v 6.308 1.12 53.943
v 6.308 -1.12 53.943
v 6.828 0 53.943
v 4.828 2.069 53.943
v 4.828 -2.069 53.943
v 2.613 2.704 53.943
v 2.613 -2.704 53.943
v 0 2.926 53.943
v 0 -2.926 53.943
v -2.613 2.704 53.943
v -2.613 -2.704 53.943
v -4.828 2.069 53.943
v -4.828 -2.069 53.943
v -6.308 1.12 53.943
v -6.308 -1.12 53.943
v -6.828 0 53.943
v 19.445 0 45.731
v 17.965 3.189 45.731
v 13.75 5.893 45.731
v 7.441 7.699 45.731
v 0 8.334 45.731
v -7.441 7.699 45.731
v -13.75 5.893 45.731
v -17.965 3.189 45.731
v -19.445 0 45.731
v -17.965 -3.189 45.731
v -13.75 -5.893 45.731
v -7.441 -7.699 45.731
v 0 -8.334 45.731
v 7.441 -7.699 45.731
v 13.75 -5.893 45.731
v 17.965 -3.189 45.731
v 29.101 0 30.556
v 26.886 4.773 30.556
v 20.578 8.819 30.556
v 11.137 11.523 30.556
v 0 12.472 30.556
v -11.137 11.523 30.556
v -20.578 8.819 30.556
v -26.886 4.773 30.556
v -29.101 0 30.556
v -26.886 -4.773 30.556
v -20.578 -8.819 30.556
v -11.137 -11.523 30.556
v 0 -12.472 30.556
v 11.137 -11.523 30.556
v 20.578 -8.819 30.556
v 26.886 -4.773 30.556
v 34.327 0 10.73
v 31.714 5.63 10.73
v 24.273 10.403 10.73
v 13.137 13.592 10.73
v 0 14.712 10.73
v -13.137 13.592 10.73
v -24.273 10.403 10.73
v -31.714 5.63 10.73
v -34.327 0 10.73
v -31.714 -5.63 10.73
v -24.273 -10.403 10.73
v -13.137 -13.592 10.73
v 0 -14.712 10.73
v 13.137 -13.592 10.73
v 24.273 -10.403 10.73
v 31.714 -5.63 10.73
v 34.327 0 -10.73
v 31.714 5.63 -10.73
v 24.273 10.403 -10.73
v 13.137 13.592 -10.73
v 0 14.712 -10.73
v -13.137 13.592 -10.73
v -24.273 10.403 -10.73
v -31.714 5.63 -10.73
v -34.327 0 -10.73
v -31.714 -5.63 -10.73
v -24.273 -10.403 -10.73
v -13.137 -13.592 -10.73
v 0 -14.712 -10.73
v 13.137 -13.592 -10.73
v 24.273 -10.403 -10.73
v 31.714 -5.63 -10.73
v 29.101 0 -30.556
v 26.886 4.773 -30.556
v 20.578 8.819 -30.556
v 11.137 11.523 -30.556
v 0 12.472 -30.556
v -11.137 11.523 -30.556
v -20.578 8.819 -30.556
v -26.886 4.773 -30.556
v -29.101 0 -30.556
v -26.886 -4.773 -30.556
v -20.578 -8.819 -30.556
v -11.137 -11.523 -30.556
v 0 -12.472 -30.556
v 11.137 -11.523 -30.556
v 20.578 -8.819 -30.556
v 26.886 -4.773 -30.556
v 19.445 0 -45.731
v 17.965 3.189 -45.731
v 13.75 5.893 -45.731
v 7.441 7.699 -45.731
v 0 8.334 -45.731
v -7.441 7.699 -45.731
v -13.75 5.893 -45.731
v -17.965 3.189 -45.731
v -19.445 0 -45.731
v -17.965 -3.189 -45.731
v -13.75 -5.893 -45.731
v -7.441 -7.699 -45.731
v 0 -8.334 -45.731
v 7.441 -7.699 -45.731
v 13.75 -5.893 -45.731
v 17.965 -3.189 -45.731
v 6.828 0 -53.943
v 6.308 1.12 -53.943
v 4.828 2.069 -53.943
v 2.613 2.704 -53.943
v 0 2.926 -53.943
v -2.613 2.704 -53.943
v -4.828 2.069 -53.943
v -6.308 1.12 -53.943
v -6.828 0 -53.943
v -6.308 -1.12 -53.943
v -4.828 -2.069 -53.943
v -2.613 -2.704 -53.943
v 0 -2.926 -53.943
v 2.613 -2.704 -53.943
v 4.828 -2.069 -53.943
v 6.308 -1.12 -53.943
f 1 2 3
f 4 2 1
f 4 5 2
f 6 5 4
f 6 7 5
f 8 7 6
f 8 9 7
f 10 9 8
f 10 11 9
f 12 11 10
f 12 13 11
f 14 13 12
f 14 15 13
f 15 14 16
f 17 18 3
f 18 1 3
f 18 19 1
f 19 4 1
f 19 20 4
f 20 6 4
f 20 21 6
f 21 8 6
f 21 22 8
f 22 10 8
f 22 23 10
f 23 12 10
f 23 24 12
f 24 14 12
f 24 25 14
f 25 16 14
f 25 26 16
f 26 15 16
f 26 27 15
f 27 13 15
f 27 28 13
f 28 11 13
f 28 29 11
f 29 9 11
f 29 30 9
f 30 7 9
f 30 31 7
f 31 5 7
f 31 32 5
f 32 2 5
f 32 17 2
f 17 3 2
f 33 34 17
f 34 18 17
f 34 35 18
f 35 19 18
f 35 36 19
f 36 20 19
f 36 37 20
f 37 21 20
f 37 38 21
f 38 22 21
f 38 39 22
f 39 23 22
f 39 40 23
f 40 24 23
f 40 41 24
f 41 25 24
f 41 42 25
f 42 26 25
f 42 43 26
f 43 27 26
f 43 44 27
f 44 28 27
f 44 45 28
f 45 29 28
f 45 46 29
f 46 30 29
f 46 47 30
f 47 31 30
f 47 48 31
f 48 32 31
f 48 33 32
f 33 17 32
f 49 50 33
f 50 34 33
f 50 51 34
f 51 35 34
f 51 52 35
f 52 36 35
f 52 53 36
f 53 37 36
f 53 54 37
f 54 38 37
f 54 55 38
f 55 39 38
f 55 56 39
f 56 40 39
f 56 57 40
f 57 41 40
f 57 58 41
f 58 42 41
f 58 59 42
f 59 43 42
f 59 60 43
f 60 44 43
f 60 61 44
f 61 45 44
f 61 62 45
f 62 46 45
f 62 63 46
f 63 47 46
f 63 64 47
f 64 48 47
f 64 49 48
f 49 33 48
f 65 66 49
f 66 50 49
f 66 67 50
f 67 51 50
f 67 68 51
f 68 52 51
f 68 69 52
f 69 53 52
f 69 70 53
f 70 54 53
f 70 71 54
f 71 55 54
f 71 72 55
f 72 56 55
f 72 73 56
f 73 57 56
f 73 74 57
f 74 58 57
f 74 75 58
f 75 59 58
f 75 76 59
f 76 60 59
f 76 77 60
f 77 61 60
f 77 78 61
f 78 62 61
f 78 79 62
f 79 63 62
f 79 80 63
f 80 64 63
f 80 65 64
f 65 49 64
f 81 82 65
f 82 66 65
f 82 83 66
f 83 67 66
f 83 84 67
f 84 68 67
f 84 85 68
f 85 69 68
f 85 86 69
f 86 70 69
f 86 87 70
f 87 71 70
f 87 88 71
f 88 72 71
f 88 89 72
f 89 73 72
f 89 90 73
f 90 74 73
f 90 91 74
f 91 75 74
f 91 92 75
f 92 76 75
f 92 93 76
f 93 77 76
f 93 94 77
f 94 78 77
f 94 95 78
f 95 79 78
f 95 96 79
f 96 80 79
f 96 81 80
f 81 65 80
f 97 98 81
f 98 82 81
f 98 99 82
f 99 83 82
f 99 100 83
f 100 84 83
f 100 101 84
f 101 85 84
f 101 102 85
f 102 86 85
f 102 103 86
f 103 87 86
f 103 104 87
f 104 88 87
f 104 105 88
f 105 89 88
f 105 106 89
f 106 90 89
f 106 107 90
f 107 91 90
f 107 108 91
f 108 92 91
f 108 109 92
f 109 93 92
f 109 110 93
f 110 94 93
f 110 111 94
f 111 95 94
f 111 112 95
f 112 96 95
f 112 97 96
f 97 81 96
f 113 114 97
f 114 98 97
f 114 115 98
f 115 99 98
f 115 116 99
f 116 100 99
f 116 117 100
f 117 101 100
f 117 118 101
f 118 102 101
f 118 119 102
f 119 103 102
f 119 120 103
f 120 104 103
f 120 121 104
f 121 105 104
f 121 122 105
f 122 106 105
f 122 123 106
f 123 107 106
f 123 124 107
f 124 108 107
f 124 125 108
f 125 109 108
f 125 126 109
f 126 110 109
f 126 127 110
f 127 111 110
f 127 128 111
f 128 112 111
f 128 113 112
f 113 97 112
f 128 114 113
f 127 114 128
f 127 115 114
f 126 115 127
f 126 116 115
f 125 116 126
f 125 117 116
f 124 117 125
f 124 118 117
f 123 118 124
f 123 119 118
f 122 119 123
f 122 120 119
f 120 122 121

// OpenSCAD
// Generated by SolidPython 1.0.1 on 2020-07-29 00:46:47


scale(v = [7, 3, 11]) {
	sphere(r = 5);
}
/***********************************************
*********      SolidPython code:      **********
************************************************
 
# import packages: SolidPython
from solid import *
from solid.utils import *
from itertools import chain, combinations, permutations


class Resize:

    def __init__(self, scad_file):
        self.scad_file = scad_file
        #self.scad_file = import_scad(scad_file)
        # cone/cylinder param:
        self.r1 = 0
        self.r2 = 0
        self.h = 0
        # rectangular prism param:
        self.w = 0
        self.l = 0
        # ellipse param:
        self.r = 0

    # import OpenScad code (file name corresponds to shape)


    # classify shape + parameters
    def assign(self, param1, param2, param3):
        if self.scad_file == 'cone.scad':
            self.r1 = param1
            self.r2 = param2
            self.h = param3
        elif self.scad_file == 'cylinder.scad':
            self.r1 = param1
            self.r2 = param2
            self.h = param3
        elif self.scad_file == 'rectangularPrism.scad':
            self.h = param1
            self.l = param2
            self.w = param3
        else:
            self.r = param1
            self.h = param2

    # resize parameters
    def iterate(self):
        x = range(3, 20, 2)
        i = 1
        if self.scad_file == 'cone.scad':
            tempList = list(permutations(x, 2))
            for temp in tempList:
                param1 = temp[0]
                param2 = temp[1]
                filepath = 'produced_scad_files/' + 'cone' + str(param1) + '_' + str(param2) + '_' + '.scad'
                scad_render_to_file(cylinder(h=param1, r1=param2, r2=0), filepath)

        elif self.scad_file == 'cylinder.scad':
            tempList = list(permutations(x, 3))
            for temp in tempList:
                param1 = temp[0]
                param2 = temp[1]
                filepath = 'produced_scad_files/' + 'cylinder' + str(param1) + '_' + str(param2) + '_' + '.scad'
                scad_render_to_file(cylinder(h=param1, r1=param2, r2=param2), filepath)

        elif self.scad_file == 'rectangularPrism.scad':
            tempList = list(permutations(x, 3))
            for temp in tempList:
                param1 = temp[0]
                param2 = temp[1]
                param3 = temp[2]
                filepath = 'produced_scad_files/' + 'rectangularPrism' + str(param1) + '_' + str(param2) + '_' + str(
                    param3) + '.scad'
                scad_render_to_file(cube(size=(param1, param2, param3)), filepath)

        elif self.scad_file == 'ellipse.scad':
            tempList = list(permutations(x, 4))
            for temp in tempList:
                param1 = temp[0]
                param2 = temp[1]
                param3 = temp[2]
                param4 = temp[3]
                filepath = 'produced_scad_files/' + 'ellipse' + str(param1) + '_' + str(param2) + '_' + str(param3) + '_' + str(param4) + '.scad'
                scad_render_to_file(scale([param1, param2, param3])(sphere(r=param4)), filepath)

    def render_to_scadfile(self):
        scad_render_to_file(scad, 'example.scad') 
 
************************************************/
